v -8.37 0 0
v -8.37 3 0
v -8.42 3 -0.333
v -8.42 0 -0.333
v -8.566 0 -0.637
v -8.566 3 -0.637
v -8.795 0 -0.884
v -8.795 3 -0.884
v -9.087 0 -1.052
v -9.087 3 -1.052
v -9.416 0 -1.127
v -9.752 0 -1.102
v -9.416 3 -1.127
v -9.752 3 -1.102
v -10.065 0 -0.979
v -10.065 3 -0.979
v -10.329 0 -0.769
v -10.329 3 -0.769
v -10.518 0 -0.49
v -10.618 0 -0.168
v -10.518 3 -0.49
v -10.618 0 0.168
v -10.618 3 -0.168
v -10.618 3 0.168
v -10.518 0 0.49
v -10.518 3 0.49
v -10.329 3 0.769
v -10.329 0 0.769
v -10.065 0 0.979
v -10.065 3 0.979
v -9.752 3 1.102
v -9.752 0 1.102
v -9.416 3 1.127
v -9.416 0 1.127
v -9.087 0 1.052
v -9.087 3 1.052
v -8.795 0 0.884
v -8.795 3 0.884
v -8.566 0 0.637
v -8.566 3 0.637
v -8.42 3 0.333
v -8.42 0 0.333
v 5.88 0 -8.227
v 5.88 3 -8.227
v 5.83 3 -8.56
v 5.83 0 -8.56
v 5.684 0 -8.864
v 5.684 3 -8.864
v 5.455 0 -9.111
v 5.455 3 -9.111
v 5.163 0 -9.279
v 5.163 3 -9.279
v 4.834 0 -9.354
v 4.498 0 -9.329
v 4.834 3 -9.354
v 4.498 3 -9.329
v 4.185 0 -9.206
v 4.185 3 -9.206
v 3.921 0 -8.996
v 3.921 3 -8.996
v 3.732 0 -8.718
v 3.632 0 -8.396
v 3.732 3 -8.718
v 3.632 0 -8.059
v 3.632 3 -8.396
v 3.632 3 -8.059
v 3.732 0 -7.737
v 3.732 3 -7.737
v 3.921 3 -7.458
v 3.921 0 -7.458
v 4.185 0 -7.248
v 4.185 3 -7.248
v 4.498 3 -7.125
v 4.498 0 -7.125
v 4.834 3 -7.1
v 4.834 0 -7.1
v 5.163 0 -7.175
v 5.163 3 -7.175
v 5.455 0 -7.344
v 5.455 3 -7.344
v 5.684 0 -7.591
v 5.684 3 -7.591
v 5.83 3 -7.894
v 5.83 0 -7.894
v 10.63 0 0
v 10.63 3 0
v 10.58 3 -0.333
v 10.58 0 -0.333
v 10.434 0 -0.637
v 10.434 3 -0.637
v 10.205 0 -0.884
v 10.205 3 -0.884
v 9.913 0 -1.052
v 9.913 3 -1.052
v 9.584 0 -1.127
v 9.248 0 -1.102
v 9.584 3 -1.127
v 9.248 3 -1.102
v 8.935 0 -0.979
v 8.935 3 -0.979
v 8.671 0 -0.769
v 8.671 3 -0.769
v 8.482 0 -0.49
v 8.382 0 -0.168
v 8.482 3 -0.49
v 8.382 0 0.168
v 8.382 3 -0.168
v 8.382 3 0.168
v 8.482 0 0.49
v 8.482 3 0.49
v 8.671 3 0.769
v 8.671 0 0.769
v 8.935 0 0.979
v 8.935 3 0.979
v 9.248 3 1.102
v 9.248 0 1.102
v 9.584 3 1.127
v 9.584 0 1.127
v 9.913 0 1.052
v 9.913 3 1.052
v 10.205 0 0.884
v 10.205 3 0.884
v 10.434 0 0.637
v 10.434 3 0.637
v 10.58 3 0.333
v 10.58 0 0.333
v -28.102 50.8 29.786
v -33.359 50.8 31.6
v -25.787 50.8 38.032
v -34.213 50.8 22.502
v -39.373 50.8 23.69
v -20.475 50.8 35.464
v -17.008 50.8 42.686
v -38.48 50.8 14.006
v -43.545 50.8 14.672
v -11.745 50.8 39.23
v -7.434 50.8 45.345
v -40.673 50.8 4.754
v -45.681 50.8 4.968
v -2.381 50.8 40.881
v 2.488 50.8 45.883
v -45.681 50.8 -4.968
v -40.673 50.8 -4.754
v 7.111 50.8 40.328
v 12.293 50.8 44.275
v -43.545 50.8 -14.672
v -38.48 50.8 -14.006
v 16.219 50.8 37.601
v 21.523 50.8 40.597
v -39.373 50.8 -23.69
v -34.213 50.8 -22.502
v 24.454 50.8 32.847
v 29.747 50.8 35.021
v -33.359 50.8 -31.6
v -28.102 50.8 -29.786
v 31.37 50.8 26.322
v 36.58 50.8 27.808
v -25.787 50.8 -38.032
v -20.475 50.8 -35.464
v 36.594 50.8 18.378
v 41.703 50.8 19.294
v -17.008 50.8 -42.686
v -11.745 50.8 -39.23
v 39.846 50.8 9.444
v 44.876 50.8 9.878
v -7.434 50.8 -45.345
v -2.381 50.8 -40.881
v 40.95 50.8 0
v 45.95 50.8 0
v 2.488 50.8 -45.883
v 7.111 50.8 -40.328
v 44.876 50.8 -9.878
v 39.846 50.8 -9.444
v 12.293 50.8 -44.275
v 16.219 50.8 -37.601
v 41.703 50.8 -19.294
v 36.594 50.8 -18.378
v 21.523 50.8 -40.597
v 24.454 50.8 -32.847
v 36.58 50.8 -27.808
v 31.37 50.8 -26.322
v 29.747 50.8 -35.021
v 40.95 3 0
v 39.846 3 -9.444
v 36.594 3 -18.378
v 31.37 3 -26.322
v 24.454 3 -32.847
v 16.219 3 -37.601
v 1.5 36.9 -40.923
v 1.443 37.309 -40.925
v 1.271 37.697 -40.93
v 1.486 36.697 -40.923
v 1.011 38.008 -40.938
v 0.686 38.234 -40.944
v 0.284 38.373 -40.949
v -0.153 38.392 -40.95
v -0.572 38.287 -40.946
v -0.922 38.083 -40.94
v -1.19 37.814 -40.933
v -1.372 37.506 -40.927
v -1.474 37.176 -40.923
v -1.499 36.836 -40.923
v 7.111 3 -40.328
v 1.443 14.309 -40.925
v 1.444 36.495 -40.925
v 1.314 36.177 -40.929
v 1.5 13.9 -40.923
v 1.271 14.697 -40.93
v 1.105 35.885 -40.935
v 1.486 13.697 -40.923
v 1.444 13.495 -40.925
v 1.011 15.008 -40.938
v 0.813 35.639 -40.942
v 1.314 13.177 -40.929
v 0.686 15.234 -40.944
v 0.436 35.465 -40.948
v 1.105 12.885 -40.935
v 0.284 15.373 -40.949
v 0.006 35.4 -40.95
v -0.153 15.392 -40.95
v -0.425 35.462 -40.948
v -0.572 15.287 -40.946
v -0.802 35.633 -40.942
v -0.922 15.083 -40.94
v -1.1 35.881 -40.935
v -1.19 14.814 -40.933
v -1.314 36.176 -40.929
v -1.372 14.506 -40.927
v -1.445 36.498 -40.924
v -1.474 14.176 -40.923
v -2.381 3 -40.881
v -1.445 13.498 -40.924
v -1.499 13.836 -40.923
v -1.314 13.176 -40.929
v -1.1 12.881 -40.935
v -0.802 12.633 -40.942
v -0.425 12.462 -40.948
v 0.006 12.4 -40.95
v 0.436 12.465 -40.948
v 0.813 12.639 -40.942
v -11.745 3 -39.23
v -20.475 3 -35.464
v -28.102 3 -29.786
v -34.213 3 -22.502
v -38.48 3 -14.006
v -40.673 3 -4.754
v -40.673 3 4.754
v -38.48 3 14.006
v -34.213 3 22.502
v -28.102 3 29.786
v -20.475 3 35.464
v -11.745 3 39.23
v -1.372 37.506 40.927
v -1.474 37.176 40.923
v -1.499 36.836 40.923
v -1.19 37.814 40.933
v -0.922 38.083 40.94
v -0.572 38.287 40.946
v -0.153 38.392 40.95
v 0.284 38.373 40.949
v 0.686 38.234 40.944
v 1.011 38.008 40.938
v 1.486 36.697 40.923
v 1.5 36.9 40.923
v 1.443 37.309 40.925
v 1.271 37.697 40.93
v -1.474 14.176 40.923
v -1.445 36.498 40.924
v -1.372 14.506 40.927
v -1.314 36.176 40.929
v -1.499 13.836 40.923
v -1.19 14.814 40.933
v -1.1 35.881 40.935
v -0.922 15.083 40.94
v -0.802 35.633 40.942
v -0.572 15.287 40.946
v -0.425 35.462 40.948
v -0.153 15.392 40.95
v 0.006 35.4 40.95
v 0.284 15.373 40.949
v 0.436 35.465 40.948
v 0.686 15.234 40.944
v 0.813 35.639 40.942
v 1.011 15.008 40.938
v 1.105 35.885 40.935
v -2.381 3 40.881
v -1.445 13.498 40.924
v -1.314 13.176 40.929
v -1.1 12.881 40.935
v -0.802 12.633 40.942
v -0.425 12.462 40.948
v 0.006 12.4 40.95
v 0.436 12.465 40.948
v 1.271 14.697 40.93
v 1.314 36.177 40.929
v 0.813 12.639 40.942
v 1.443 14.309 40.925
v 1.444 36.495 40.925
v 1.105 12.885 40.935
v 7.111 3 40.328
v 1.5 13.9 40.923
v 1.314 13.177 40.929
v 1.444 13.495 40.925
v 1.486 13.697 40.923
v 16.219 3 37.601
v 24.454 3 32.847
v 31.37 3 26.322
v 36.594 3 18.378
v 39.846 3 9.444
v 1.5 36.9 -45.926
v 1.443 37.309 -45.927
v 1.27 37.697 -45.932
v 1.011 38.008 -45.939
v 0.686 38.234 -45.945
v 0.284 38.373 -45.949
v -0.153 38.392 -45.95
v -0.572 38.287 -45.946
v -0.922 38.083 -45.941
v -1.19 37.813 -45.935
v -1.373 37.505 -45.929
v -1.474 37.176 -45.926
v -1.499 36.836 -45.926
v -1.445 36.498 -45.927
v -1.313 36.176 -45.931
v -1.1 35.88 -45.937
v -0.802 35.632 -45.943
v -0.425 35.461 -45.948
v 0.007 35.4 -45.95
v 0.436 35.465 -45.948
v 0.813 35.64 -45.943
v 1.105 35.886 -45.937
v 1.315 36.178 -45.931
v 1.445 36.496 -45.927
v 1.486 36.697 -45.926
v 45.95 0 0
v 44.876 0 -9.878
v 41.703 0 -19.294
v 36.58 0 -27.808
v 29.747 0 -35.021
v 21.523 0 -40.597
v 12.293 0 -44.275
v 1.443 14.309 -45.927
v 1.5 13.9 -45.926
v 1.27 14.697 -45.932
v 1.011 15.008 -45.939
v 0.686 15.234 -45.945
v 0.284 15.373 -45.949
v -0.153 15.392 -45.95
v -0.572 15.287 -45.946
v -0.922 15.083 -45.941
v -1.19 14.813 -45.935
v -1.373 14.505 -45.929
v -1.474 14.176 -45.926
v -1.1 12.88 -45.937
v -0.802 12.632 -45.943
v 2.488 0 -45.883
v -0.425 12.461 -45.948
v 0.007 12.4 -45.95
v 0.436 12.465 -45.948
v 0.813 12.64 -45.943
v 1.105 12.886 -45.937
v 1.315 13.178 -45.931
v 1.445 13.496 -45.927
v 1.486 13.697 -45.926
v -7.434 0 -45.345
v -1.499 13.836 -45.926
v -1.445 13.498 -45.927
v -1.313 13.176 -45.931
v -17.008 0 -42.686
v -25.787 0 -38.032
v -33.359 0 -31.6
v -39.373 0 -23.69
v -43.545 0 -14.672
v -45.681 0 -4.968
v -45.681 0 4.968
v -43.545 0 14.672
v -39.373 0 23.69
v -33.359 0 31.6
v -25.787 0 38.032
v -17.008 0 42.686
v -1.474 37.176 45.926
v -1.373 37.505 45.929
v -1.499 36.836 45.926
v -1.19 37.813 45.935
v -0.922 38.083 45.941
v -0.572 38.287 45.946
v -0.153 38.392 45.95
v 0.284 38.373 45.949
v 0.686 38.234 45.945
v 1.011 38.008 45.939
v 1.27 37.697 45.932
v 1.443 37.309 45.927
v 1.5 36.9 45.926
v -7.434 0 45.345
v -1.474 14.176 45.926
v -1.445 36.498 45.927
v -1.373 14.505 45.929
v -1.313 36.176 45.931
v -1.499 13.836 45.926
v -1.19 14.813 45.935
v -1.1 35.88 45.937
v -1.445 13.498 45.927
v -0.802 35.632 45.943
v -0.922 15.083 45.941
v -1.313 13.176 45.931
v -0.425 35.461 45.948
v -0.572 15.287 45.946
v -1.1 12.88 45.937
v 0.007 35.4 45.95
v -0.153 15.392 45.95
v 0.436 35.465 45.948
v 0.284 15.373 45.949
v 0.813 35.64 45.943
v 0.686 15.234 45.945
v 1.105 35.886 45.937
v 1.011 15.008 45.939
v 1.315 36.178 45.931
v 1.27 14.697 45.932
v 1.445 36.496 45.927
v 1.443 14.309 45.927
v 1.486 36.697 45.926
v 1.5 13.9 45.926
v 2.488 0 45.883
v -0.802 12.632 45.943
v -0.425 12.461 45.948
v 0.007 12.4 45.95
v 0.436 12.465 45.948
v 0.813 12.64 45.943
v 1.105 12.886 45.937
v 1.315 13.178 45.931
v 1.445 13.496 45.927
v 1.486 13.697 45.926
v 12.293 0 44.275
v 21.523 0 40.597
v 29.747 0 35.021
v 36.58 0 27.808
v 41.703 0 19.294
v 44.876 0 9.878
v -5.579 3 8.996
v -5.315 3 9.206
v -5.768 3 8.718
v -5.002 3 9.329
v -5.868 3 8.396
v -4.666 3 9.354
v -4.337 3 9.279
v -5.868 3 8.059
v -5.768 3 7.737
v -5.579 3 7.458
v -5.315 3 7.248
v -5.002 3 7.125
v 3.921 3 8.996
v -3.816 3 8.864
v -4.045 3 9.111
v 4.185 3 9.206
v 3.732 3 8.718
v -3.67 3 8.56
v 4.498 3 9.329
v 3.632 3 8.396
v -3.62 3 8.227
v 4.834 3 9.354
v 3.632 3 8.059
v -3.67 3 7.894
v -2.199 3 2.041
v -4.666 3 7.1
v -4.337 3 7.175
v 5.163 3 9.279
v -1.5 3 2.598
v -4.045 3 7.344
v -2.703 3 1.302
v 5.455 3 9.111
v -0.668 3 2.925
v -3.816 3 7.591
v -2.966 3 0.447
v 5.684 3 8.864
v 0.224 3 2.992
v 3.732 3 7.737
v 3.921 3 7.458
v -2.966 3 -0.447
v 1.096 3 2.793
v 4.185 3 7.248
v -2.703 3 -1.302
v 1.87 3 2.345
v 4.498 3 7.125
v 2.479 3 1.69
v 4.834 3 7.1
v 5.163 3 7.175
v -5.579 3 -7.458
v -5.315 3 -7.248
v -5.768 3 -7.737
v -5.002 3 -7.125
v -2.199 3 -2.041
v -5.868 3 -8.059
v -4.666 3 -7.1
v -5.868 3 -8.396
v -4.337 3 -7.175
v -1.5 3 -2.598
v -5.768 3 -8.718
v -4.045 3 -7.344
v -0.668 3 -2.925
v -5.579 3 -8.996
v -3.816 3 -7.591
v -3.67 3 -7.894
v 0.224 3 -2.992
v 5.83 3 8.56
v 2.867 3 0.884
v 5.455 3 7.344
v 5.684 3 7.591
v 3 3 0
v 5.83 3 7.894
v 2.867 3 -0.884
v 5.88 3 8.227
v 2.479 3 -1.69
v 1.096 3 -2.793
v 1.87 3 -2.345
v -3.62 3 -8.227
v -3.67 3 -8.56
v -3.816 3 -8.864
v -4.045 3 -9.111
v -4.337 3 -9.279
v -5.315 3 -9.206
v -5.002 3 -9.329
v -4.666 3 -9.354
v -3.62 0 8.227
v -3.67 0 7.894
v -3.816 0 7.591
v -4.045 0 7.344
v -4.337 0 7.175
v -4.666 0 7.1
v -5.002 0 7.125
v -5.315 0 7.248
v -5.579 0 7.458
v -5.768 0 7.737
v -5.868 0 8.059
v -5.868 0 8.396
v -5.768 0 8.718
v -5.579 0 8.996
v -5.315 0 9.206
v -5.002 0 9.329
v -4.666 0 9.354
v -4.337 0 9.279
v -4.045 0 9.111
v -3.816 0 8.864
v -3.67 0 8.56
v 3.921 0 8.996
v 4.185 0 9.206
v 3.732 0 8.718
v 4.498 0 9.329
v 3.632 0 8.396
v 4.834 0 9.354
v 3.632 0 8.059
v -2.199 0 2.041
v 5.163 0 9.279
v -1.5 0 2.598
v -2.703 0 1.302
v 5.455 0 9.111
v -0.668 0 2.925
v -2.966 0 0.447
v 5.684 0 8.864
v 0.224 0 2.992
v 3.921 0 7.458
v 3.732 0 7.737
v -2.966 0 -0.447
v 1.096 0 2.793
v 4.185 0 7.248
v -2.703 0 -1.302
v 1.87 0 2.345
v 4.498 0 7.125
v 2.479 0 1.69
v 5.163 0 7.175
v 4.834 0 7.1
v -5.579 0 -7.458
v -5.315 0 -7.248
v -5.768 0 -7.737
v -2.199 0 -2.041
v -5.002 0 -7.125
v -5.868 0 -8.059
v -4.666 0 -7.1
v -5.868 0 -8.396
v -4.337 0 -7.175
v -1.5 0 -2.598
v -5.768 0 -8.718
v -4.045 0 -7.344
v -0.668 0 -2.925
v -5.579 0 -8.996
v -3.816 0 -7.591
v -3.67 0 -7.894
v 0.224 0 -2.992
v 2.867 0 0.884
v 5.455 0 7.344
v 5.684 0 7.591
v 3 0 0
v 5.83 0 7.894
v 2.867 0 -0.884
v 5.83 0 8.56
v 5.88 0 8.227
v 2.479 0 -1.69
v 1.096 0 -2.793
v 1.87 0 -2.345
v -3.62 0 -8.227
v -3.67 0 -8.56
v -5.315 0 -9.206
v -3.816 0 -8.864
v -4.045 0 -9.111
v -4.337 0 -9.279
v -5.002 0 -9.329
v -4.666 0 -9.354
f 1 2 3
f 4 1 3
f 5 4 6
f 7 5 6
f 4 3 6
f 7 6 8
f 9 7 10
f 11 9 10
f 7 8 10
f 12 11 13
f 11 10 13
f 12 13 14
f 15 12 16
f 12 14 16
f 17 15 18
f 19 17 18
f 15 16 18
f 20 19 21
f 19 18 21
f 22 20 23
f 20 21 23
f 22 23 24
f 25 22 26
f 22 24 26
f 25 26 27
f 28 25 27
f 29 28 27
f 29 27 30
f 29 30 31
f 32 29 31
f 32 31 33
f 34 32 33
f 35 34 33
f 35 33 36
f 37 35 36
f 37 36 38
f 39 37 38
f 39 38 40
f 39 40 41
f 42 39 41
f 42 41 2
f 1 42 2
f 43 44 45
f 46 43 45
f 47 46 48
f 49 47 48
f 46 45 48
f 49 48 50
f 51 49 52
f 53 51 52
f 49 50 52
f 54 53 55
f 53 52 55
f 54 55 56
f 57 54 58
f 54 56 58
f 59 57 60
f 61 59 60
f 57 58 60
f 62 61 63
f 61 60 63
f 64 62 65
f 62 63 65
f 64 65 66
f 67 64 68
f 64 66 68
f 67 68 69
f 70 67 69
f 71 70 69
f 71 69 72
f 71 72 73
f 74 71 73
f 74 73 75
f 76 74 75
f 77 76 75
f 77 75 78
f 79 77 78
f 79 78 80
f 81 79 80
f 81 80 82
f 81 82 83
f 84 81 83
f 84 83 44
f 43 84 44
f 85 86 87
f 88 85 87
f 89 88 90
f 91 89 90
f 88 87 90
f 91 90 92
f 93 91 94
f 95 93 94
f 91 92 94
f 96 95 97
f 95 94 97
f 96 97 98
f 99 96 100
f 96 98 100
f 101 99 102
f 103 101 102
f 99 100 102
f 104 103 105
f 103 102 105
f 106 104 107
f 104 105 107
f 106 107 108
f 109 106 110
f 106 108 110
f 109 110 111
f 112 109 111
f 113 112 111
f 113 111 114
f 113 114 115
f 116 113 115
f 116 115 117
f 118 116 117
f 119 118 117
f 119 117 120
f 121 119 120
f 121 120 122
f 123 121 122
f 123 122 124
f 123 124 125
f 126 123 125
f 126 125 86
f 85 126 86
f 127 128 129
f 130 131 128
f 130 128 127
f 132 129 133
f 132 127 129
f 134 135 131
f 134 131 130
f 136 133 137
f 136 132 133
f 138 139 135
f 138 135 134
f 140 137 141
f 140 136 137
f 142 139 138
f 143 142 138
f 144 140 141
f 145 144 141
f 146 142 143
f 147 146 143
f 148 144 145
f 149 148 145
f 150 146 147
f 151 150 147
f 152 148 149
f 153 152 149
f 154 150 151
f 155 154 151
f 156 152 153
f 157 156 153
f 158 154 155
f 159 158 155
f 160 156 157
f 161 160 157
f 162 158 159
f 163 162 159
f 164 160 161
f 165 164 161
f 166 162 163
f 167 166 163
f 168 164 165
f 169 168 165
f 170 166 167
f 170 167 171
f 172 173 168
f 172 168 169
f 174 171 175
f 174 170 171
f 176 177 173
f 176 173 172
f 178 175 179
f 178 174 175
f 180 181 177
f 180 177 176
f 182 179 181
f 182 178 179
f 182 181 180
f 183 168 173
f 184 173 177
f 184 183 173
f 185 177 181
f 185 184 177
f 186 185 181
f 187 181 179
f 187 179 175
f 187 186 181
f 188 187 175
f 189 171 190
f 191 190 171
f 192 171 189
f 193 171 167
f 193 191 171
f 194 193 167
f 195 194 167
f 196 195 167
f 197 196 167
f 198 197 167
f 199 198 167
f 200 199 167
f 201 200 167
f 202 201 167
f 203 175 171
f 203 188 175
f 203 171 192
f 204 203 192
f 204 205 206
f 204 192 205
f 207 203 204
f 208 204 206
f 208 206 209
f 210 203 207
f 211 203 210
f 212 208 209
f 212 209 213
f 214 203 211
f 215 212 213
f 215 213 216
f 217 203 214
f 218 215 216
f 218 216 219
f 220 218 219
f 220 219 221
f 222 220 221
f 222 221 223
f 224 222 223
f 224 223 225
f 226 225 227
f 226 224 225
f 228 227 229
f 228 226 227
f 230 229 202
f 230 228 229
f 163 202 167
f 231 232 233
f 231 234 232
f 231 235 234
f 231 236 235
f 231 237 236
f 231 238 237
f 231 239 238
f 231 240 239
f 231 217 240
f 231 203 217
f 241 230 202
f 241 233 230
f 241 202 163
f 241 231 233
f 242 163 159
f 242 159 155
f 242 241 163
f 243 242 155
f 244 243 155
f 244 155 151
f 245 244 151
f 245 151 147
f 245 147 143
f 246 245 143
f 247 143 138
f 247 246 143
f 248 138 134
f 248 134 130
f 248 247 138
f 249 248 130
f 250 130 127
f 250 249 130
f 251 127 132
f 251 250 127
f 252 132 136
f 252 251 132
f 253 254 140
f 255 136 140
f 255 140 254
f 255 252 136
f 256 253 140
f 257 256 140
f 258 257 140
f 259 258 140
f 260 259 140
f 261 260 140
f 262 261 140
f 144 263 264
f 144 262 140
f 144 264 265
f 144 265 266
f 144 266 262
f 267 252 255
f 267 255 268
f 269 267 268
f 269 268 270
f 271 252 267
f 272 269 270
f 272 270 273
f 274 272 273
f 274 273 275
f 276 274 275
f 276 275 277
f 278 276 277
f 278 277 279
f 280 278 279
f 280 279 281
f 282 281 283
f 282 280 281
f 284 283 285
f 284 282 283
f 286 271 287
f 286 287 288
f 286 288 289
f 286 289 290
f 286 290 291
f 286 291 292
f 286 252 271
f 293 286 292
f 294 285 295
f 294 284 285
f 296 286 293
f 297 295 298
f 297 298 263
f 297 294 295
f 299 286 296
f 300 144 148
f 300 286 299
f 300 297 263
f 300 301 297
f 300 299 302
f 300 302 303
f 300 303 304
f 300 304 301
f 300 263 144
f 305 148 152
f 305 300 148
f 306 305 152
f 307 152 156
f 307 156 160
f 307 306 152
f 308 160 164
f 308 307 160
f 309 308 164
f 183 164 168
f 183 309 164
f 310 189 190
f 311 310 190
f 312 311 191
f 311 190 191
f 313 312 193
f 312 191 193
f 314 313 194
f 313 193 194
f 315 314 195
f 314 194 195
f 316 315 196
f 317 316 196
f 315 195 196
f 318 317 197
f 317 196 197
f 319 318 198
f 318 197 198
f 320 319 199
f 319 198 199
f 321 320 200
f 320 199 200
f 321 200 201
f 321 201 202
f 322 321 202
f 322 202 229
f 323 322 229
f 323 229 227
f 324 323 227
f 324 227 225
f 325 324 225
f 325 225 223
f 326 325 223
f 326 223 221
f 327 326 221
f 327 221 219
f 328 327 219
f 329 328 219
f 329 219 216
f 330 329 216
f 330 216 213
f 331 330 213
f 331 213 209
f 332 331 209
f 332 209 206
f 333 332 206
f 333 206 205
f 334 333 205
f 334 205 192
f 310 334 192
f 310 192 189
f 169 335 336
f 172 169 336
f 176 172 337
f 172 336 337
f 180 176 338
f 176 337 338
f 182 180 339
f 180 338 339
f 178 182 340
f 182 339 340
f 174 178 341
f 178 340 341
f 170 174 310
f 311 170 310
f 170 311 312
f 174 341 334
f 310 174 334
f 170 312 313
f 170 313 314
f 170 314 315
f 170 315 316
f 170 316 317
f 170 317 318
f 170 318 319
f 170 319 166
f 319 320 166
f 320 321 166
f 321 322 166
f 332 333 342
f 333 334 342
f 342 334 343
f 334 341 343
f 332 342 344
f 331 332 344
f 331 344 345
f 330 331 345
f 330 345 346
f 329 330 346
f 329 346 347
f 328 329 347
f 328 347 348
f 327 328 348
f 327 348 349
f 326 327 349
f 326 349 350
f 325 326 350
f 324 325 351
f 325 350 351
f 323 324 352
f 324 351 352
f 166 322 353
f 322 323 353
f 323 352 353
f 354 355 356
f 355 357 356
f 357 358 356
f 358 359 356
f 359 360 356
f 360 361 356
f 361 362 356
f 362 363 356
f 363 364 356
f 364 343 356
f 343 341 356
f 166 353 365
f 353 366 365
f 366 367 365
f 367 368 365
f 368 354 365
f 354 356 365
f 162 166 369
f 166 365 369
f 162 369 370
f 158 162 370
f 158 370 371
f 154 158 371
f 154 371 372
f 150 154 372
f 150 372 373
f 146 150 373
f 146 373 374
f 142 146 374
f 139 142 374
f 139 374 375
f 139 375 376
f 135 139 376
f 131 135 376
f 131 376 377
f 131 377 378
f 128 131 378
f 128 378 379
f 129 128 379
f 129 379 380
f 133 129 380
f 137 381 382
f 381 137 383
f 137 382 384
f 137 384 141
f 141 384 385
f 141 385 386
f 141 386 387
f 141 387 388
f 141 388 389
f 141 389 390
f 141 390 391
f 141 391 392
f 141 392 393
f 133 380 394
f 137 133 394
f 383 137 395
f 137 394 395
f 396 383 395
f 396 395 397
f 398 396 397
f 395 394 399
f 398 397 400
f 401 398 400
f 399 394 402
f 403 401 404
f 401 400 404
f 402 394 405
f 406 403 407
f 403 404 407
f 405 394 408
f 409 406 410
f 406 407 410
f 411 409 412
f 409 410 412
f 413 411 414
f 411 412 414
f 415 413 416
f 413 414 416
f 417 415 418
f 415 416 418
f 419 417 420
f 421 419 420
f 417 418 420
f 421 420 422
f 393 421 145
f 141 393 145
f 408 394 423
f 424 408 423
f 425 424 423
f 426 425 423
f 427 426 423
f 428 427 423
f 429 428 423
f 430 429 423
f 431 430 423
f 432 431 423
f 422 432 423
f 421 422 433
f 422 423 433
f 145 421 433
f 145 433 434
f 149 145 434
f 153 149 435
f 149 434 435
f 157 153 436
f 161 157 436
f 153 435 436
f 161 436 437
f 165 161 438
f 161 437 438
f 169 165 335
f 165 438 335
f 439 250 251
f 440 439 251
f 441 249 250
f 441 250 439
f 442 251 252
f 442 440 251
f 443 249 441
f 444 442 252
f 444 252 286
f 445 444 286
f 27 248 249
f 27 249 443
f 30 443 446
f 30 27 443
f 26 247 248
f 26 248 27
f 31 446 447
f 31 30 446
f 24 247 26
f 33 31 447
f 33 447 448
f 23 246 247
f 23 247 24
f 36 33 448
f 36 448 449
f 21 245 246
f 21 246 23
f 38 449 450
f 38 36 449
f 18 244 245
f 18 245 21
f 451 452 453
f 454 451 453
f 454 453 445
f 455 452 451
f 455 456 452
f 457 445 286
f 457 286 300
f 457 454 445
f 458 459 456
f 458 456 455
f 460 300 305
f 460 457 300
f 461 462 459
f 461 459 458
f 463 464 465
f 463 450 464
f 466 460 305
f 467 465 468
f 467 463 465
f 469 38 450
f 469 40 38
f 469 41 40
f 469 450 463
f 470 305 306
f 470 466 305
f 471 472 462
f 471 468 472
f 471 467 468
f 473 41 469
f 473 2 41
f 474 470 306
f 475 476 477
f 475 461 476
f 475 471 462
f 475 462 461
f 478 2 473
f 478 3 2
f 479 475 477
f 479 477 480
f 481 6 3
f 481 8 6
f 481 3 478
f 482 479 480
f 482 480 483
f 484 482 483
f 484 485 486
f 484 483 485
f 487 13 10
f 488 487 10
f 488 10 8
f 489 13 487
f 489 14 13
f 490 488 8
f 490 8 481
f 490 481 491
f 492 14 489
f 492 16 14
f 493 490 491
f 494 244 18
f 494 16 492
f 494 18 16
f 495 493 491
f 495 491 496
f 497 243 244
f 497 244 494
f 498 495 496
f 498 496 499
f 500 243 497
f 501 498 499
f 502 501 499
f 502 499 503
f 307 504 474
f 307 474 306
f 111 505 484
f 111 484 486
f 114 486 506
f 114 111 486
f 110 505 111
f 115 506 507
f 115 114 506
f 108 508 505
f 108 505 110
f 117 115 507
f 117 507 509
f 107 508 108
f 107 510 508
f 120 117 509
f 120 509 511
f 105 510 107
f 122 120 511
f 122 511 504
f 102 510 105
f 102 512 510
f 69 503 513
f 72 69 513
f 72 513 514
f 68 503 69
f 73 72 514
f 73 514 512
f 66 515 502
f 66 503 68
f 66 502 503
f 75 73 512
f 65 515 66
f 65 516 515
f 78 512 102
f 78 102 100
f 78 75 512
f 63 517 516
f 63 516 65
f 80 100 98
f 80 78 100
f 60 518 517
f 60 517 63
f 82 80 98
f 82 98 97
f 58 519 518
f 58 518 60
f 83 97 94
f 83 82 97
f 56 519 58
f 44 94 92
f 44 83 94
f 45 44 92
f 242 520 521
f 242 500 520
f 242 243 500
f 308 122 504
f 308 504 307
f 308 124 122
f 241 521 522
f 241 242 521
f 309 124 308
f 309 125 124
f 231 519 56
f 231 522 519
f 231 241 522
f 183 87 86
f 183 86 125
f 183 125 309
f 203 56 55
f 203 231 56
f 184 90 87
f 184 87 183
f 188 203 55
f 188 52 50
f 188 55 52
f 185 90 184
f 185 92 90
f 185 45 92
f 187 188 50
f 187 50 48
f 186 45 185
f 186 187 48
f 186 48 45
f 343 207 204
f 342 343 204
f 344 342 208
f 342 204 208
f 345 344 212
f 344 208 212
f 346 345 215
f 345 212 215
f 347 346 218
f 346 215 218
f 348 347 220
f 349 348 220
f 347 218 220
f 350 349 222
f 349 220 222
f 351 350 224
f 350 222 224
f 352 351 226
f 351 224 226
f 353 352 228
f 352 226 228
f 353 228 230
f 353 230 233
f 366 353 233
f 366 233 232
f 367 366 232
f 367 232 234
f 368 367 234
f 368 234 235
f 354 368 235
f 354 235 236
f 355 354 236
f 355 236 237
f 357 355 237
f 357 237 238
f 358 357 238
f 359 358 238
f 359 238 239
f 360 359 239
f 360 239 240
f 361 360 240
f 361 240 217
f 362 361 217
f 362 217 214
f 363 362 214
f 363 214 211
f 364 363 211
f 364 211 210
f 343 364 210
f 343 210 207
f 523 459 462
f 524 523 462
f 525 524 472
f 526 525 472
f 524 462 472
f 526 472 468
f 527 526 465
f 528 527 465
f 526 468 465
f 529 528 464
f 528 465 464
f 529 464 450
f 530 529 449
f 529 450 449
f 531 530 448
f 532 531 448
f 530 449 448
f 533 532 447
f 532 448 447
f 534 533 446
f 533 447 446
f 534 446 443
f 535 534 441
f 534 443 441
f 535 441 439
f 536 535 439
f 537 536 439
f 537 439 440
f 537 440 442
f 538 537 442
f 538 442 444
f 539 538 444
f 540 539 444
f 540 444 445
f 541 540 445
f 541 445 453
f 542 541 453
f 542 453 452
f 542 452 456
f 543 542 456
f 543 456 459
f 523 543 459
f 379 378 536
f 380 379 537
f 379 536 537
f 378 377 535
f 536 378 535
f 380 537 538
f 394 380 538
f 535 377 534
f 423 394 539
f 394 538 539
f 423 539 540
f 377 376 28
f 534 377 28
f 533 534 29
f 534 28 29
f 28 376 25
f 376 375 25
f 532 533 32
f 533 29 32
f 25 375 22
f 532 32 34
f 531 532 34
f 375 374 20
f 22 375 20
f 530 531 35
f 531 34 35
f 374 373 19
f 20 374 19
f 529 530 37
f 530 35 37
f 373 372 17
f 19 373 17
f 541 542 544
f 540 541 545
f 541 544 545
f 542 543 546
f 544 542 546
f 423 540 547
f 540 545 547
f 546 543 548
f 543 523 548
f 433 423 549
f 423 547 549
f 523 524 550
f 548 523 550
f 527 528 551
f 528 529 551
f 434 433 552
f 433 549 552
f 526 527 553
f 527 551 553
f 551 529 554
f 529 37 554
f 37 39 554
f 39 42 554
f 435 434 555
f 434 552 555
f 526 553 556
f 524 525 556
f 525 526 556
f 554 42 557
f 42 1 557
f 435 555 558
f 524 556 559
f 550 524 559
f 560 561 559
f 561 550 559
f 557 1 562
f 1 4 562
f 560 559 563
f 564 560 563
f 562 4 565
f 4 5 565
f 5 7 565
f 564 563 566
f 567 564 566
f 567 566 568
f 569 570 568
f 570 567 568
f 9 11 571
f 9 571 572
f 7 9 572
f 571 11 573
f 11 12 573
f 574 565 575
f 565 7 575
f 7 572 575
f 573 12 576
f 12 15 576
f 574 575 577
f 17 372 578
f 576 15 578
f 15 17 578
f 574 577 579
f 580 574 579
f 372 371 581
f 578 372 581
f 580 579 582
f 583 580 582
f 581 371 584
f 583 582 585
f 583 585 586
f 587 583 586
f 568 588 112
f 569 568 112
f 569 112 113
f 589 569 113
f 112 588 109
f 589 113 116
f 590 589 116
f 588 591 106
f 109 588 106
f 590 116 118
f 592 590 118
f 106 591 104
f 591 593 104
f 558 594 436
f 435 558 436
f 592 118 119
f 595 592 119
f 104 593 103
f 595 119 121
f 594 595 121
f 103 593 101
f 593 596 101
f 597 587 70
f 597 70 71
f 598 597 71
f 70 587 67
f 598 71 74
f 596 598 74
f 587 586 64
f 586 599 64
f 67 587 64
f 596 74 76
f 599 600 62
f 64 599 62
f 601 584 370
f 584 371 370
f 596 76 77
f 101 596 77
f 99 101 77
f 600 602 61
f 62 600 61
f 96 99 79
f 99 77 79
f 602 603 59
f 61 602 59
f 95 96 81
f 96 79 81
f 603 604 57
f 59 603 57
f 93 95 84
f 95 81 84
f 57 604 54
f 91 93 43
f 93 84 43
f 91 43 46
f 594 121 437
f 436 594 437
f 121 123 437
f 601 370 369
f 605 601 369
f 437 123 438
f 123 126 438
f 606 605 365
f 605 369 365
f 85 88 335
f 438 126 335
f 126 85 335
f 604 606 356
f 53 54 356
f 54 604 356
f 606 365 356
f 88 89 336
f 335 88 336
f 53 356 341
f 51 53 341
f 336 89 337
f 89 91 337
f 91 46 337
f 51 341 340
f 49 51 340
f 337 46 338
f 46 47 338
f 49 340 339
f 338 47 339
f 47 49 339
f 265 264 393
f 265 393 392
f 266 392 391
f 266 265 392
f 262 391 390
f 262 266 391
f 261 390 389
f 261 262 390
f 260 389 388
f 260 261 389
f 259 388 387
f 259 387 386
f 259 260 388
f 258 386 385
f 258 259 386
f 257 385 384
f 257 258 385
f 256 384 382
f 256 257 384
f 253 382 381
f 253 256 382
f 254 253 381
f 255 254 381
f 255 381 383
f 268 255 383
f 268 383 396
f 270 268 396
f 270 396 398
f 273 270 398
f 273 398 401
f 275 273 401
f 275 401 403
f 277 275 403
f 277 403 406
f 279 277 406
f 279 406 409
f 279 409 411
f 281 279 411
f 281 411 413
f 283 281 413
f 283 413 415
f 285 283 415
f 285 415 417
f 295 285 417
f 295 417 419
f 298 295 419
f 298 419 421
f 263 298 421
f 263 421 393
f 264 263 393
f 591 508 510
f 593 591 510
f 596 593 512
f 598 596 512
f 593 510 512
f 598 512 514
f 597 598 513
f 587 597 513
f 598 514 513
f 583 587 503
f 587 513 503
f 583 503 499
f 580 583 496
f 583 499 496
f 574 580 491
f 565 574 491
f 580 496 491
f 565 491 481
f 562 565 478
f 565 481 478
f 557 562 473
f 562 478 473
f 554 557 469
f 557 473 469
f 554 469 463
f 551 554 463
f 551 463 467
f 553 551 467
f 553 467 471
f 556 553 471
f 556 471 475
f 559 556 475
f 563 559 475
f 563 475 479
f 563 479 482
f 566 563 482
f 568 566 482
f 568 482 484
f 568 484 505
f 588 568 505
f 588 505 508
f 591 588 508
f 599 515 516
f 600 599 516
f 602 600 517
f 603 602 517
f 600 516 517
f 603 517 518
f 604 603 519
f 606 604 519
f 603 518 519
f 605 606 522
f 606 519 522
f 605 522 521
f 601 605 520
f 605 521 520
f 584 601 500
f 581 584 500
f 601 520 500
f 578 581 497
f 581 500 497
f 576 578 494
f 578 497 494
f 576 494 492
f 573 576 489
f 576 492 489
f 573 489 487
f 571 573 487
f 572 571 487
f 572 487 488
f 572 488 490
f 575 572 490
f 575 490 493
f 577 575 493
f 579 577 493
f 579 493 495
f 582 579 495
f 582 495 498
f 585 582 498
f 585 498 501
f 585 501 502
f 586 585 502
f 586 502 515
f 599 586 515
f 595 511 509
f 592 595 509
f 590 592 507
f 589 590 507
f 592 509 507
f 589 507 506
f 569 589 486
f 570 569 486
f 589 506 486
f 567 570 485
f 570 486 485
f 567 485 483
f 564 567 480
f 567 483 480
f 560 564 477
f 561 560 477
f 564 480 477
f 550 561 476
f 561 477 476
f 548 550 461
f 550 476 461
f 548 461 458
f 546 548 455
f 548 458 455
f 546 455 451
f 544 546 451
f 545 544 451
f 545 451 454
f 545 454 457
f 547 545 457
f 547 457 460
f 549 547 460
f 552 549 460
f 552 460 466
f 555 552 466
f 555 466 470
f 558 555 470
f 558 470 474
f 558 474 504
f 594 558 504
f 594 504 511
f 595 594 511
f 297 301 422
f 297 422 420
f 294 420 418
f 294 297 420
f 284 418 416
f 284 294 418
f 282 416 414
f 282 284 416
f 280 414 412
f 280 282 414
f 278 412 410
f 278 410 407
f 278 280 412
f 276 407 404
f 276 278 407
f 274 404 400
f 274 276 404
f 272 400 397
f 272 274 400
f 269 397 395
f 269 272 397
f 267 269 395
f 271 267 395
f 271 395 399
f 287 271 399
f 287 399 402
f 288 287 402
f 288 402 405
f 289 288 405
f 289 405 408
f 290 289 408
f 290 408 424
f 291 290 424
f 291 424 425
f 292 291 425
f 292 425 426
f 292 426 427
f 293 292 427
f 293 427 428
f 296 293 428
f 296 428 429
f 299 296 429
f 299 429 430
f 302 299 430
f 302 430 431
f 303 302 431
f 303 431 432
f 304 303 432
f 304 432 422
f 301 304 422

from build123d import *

# Parameters (mm, degrees)
SKETCH1_R                 = 45.95
BOSS_EXTRUDE1_DEPTH       = 3
SKETCH2_R                 = 45.95
SKETCH2_R_2               = 40.95
BOSS_EXTRUDE2_DEPTH       = 22.4
F_4_40_TAPPED_HOLE3_D     = 2.2606
F_4_40_TAPPED_HOLE3_DEPTH = 7.6
F_4_40_TAPPED_HOLE3_TIP   = 0.679152758
SKETCH11_R                = 1.5
CUT_EXTRUDE1_DEPTH        = 46.95
CUT_EXTRUDE1_DEPTH_BACK   = 46.95
SKETCH12_R                = 45.95
SKETCH12_R_2              = 40.95
BOSS_EXTRUDE3_DEPTH       = 25.4
SKETCH14_R                = 1.5
CUT_EXTRUDE2_DEPTH        = 46.95000011
CUT_EXTRUDE2_DEPTH_BACK   = 46.95000011
SKETCH15_R                = 3
CUT_EXTRUDE3_DEPTH        = 10


with BuildPart() as part:
    # Sketch1 → Boss-Extrude1 (new body)
    with BuildSketch(Plane(origin=(0, 0, 0), x_dir=(1, 0, 0), z_dir=(0, 1, 0))):
        Circle(SKETCH1_R)
    extrude(amount=BOSS_EXTRUDE1_DEPTH)

    # Sketch2 → Boss-Extrude2 (add)
    with BuildSketch(Plane(origin=(0, 3, 0), x_dir=(1, 0, 0), z_dir=(0, 1, 0))):
        Circle(SKETCH2_R)
        Circle(SKETCH2_R_2, mode=Mode.SUBTRACT)
    extrude(amount=BOSS_EXTRUDE2_DEPTH)

    # #4-40 Tapped Hole3
    with Locations(Plane(origin=(0, 0, 0), x_dir=(-1, 0, 0), z_dir=(0, -1, 0))):
        with Locations((9.5, 0), (4.75, -8.227241336), (-4.75, -8.227241336), (-9.5, 0), (-4.75, 8.227241336), (4.75, 8.227241336)):
            Hole(F_4_40_TAPPED_HOLE3_D / 2, depth=F_4_40_TAPPED_HOLE3_DEPTH)
            with Locations((0, 0, -(F_4_40_TAPPED_HOLE3_DEPTH + F_4_40_TAPPED_HOLE3_TIP / 2))):  # 118° drill point
                Cone(0, F_4_40_TAPPED_HOLE3_D / 2, F_4_40_TAPPED_HOLE3_TIP, mode=Mode.SUBTRACT)

    # Sketch11 → Cut-Extrude1 (cut, two sides)
    with BuildSketch(Plane.XY) as cut_extrude1_sk:
        with Locations((0, 13.9)):
            Circle(SKETCH11_R)
        with Locations((0, -13.9)):
            Circle(SKETCH11_R)
    extrude(amount=CUT_EXTRUDE1_DEPTH, mode=Mode.SUBTRACT)
    extrude(cut_extrude1_sk.sketch, amount=-CUT_EXTRUDE1_DEPTH_BACK, mode=Mode.SUBTRACT)

    # Sketch12 → Boss-Extrude3 (add)
    with BuildSketch(Plane(origin=(0, 25.4, 0), x_dir=(1, 0, 0), z_dir=(0, 1, 0))):
        Circle(SKETCH12_R)
        Circle(SKETCH12_R_2, mode=Mode.SUBTRACT)
    extrude(amount=BOSS_EXTRUDE3_DEPTH)

    # Sketch14 → Cut-Extrude2 (cut, two sides)
    with BuildSketch(Plane.XY) as cut_extrude2_sk:
        with Locations((0, 36.9)):
            Circle(SKETCH14_R)
    extrude(amount=CUT_EXTRUDE2_DEPTH, mode=Mode.SUBTRACT)
    extrude(cut_extrude2_sk.sketch, amount=-CUT_EXTRUDE2_DEPTH_BACK, mode=Mode.SUBTRACT)

    # Sketch15 → Cut-Extrude3 (cut)
    with BuildSketch(Plane(origin=(0, 3, 0), x_dir=(1, 0, 0), z_dir=(0, 1, 0))):
        Circle(SKETCH15_R)
    extrude(amount=-CUT_EXTRUDE3_DEPTH, mode=Mode.SUBTRACT)


solid = part.part
